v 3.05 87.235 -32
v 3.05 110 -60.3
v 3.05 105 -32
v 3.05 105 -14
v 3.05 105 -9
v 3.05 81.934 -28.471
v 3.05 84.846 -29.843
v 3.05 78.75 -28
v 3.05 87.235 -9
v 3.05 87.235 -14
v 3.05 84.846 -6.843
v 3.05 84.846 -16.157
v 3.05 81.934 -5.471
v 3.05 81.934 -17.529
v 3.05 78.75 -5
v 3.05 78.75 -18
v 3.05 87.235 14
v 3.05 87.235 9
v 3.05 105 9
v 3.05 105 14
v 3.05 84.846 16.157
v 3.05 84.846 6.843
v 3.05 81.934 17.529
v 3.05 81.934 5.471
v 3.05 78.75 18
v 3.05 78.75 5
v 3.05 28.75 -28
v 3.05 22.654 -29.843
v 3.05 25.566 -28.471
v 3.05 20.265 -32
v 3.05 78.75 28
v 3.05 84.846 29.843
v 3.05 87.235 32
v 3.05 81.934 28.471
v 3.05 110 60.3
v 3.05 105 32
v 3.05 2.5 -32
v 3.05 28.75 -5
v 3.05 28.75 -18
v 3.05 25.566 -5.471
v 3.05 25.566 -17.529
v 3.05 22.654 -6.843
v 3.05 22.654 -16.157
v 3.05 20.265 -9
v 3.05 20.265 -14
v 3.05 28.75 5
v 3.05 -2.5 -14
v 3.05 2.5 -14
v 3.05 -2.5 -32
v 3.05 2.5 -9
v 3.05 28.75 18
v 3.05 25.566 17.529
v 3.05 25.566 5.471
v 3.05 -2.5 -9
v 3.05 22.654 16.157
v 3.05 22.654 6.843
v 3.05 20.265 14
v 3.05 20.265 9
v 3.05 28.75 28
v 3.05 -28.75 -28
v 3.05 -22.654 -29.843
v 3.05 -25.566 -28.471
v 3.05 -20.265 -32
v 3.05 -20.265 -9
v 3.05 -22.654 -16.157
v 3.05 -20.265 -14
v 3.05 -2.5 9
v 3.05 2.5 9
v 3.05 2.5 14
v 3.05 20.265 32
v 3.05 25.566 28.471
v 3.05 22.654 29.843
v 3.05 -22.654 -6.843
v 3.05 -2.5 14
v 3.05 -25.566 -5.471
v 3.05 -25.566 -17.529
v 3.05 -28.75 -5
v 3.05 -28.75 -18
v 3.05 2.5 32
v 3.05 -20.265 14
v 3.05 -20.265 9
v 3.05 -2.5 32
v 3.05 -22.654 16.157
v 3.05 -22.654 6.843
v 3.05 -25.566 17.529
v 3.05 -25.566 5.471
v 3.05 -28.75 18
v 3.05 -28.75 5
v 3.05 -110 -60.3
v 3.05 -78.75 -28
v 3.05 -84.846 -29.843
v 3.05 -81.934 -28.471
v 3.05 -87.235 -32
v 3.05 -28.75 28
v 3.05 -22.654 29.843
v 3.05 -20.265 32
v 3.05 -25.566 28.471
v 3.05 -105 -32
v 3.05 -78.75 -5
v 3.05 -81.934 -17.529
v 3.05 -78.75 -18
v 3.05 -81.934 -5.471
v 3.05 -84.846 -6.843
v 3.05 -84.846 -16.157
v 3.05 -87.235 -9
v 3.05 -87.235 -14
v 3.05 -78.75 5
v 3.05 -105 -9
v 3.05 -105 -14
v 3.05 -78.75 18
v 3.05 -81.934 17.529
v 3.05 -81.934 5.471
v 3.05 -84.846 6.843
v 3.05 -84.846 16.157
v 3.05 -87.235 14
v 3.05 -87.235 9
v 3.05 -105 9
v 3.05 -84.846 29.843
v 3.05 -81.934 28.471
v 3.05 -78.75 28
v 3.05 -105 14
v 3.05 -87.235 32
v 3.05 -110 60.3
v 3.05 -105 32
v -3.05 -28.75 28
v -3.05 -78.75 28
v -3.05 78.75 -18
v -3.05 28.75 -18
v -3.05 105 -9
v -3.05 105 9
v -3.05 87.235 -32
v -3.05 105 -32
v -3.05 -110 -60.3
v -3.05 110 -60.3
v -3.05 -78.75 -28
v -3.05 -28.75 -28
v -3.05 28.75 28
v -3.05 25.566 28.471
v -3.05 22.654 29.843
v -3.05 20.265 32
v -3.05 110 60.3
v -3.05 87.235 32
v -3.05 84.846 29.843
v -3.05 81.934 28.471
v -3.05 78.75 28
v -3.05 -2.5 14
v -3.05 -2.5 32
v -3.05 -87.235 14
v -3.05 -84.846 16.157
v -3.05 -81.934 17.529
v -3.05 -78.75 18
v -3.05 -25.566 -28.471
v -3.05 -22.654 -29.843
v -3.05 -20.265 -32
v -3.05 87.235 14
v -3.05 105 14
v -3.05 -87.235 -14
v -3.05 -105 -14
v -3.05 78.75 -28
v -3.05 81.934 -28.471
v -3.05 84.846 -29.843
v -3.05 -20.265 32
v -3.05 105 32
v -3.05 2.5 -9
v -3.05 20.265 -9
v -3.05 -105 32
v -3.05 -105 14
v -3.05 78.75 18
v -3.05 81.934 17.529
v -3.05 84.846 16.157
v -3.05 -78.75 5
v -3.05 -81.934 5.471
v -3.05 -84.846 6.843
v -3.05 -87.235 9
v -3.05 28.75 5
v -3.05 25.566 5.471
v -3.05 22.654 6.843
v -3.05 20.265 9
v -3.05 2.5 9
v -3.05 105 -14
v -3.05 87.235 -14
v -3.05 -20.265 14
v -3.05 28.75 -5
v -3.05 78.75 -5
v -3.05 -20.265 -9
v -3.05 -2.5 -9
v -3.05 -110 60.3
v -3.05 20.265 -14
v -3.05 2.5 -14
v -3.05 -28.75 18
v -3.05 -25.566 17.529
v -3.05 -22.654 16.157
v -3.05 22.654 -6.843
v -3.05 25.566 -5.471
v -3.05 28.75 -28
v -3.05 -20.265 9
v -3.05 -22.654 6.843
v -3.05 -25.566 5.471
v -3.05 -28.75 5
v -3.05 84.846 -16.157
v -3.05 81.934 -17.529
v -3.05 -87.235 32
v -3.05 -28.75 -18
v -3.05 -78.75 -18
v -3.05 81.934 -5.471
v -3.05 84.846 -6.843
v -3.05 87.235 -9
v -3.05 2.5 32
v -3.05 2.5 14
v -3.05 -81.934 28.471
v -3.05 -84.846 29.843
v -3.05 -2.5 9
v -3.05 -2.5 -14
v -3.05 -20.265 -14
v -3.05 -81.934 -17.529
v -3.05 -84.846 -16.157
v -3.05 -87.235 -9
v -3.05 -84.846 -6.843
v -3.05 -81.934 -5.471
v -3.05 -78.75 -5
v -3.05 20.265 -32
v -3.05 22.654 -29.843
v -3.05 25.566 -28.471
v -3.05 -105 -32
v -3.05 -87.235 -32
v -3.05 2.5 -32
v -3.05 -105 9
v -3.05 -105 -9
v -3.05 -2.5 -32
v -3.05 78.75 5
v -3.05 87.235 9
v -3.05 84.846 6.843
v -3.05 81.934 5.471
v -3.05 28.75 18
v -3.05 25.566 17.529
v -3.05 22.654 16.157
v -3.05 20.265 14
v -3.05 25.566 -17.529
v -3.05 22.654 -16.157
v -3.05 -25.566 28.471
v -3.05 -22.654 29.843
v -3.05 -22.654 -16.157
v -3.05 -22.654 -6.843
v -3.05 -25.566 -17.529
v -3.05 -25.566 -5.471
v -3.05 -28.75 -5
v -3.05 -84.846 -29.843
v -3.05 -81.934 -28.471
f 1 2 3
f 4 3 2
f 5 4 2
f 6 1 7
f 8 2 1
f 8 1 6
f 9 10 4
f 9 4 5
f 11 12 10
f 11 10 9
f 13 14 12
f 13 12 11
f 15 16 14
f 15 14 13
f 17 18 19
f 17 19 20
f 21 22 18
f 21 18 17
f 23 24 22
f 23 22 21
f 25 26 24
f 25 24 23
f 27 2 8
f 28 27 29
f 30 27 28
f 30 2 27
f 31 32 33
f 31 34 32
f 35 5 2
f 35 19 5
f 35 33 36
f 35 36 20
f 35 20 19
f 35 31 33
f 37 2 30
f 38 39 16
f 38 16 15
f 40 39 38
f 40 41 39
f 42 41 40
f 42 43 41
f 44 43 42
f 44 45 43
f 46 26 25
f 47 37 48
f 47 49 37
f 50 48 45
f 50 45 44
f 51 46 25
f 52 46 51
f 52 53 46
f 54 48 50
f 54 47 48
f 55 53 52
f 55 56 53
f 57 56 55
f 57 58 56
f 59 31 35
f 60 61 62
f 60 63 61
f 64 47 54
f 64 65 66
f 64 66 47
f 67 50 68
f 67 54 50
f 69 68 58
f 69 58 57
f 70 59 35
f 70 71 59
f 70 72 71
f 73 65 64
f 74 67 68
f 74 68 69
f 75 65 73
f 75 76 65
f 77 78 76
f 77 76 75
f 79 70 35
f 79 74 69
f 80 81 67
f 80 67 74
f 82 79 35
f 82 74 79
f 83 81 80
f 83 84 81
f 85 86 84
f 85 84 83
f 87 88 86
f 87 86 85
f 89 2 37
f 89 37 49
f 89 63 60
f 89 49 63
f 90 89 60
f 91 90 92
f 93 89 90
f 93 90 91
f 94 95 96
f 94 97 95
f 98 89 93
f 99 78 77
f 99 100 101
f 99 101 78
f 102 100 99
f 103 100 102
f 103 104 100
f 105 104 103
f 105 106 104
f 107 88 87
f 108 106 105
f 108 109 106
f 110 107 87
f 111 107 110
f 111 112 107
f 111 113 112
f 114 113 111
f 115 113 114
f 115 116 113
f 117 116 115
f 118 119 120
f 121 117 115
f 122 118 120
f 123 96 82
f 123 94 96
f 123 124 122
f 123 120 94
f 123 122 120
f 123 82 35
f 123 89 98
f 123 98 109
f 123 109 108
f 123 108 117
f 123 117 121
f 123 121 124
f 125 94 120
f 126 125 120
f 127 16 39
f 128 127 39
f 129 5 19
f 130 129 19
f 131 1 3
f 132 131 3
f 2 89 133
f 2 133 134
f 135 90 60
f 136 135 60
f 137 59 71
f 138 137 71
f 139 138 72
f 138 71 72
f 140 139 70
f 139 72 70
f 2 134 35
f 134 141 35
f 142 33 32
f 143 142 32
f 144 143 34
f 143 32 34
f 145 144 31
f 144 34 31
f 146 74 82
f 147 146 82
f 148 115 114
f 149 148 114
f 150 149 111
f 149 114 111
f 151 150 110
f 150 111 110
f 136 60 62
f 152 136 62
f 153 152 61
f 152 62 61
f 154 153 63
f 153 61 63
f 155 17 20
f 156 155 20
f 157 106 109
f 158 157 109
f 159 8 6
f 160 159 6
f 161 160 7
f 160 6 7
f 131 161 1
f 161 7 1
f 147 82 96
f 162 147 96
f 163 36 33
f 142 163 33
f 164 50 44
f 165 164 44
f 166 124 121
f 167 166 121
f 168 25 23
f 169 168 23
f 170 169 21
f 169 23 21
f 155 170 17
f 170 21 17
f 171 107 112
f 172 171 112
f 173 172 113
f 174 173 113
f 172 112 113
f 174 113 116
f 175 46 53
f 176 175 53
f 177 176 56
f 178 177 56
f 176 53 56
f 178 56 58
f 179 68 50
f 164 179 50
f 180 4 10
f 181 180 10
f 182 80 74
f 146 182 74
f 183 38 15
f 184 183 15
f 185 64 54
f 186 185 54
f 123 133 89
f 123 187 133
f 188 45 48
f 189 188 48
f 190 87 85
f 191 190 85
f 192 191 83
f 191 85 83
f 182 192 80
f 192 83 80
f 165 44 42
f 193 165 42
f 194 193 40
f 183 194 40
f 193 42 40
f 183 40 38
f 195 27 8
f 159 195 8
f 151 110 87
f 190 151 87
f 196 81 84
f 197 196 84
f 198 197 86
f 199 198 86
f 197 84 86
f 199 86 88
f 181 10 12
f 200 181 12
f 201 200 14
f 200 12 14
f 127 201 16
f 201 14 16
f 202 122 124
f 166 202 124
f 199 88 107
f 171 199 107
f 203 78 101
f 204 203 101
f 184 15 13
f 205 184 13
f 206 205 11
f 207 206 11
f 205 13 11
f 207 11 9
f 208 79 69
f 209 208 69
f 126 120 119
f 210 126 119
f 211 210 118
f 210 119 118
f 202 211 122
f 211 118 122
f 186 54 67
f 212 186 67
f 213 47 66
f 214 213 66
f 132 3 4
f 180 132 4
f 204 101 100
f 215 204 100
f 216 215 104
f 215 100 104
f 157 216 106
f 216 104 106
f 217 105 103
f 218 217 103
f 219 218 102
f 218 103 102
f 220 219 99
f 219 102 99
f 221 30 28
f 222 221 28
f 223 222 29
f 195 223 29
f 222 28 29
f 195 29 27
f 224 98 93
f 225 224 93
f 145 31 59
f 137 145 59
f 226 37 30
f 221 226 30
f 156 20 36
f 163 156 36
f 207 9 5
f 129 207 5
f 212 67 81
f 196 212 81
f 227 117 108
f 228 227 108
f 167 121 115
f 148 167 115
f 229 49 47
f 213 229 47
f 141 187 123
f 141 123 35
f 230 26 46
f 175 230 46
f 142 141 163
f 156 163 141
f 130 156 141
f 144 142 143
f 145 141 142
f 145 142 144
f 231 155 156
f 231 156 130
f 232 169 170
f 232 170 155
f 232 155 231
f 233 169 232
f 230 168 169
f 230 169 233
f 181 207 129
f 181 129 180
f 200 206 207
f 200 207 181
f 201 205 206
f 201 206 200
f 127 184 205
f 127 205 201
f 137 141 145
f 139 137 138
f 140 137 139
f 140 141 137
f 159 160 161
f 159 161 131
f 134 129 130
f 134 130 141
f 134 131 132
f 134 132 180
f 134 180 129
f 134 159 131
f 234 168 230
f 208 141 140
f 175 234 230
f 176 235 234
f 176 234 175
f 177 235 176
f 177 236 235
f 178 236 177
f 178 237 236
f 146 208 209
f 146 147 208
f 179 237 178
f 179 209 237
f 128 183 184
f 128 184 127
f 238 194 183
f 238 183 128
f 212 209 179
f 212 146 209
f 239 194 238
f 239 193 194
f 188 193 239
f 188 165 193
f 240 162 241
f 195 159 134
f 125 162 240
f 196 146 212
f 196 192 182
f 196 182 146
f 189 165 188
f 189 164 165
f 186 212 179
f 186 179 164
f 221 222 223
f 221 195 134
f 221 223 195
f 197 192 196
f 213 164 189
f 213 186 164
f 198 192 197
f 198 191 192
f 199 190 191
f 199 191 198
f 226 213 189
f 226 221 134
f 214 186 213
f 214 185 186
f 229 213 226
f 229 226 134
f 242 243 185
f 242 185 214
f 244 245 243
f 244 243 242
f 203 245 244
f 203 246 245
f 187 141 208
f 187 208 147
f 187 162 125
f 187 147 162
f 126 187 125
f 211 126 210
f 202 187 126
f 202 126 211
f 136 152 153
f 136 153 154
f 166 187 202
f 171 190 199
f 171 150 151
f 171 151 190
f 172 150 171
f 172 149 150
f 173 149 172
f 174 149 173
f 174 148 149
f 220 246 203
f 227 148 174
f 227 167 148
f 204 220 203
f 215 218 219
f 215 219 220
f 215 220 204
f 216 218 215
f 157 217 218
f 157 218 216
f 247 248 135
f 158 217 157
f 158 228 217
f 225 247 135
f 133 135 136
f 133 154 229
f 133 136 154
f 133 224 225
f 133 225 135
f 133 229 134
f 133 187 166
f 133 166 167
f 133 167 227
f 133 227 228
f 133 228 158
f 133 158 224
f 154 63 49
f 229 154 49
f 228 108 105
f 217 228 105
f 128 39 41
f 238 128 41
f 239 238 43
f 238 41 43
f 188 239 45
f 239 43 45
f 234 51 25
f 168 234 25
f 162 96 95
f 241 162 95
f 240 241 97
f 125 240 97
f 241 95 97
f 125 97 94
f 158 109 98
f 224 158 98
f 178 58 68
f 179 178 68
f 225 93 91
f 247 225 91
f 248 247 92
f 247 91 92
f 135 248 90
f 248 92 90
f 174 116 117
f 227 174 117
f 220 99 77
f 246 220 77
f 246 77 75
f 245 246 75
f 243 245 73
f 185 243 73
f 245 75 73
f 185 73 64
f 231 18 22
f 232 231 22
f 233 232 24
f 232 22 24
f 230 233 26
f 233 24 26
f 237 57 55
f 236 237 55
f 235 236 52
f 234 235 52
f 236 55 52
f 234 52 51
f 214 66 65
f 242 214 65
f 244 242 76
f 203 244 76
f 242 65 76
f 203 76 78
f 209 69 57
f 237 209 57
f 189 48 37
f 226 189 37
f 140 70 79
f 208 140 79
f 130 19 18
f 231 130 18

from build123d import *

# Parameters (mm, degrees)
F1_DEPTH = 110
F3_DEPTH = 6.1
F4_W     = 220
F4_H     = 15.7
F5_DEPTH = 100


with BuildPart() as f1:
    # F0 (on Front) → F1 (new body, symmetric)
    with BuildSketch(Plane.XZ):
        with BuildLine():
            ThreePointArc((11.95, -69.2), (5.6567496474, -66.5932503526), (3.05, -60.3))
            Line((3.05, -60.3), (3.05, 60.3))
            ThreePointArc((3.05, 60.3), (5.6567496474, 66.5932503526), (11.95, 69.2))
            Line((11.95, 69.2), (76, 69.2))
            Line((76, 69.2), (76, 76))
            Line((76, 76), (-76, 76))
            Line((-76, 76), (-76, 69.2))
            Line((-76, 69.2), (-11.95, 69.2))
            ThreePointArc((-11.95, 69.2), (-5.6567496474, 66.5932503526), (-3.05, 60.3))
            Line((-3.05, 60.3), (-3.05, -60.3))
            ThreePointArc((-3.05, -60.3), (-5.6567496474, -66.5932503526), (-11.95, -69.2))
            Line((-11.95, -69.2), (-76, -69.2))
            Line((-76, -69.2), (-76, -76))
            Line((-76, -76), (76, -76))
            Line((76, -76), (76, -69.2))
            Line((76, -69.2), (11.95, -69.2))
        make_face()
    extrude(amount=F1_DEPTH, both=True)

    # F2 (on face) → F3 (cut)
    with BuildSketch(Plane.YZ.offset(3.05)):
        with BuildLine():
            Line((-20.2647186258, -9), (-2.5, -9))
            Line((-2.5, -9), (-2.5, 9))
            Line((-2.5, 9), (-20.2647186258, 9))
            ThreePointArc((-20.2647186258, 9), (-24.0595842402, 6.0501256289), (-28.75, 5))
            Line((-28.75, 5), (-78.75, 5))
            ThreePointArc((-78.75, 5), (-83.4404157598, 6.0501256289), (-87.2352813742, 9))
            Line((-87.2352813742, 9), (-105, 9))
            Line((-105, 9), (-105, -9))
            Line((-105, -9), (-87.2352813742, -9))
            ThreePointArc((-87.2352813742, -9), (-83.4404157598, -6.0501256289), (-78.75, -5))
            Line((-78.75, -5), (-28.75, -5))
            ThreePointArc((-28.75, -5), (-24.0595842402, -6.0501256289), (-20.2647186258, -9))
        make_face()
        with BuildLine():
            ThreePointArc((-20.2647186258, 32), (-24.0595842402, 29.0501256289), (-28.75, 28))
            Line((-28.75, 28), (-78.75, 28))
            ThreePointArc((-78.75, 28), (-83.4404157598, 29.0501256289), (-87.2352813742, 32))
            Line((-87.2352813742, 32), (-105, 32))
            Line((-105, 32), (-105, 14))
            Line((-105, 14), (-87.2352813742, 14))
            ThreePointArc((-87.2352813742, 14), (-83.4404157598, 16.9498743711), (-78.75, 18))
            Line((-78.75, 18), (-28.75, 18))
            ThreePointArc((-28.75, 18), (-24.0595842402, 16.9498743711), (-20.2647186258, 14))
            Line((-20.2647186258, 14), (-2.5, 14))
            Line((-2.5, 14), (-2.5, 32))
            Line((-2.5, 32), (-20.2647186258, 32))
        make_face()
        with BuildLine():
            ThreePointArc((-28.75, -28), (-24.0595842402, -29.0501256289), (-20.2647186258, -32))
            Line((-20.2647186258, -32), (-2.5, -32))
            Line((-2.5, -32), (-2.5, -14))
            Line((-2.5, -14), (-20.2647186258, -14))
            ThreePointArc((-20.2647186258, -14), (-24.0595842402, -16.9498743711), (-28.75, -18))
            Line((-28.75, -18), (-78.75, -18))
            ThreePointArc((-78.75, -18), (-83.4404157598, -16.9498743711), (-87.2352813742, -14))
            Line((-87.2352813742, -14), (-105, -14))
            Line((-105, -14), (-105, -32))
            Line((-105, -32), (-87.2352813742, -32))
            ThreePointArc((-87.2352813742, -32), (-83.4404157598, -29.0501256289), (-78.75, -28))
            Line((-78.75, -28), (-28.75, -28))
        make_face()
        with BuildLine():
            Line((78.75, 28), (28.75, 28))
            ThreePointArc((28.75, 28), (24.0595842402, 29.0501256289), (20.2647186258, 32))
            Line((20.2647186258, 32), (2.5, 32))
            Line((2.5, 32), (2.5, 14))
            Line((2.5, 14), (20.2647186258, 14))
            ThreePointArc((20.2647186258, 14), (24.0595842402, 16.9498743711), (28.75, 18))
            Line((28.75, 18), (78.75, 18))
            ThreePointArc((78.75, 18), (83.4404157598, 16.9498743711), (87.2352813742, 14))
            Line((87.2352813742, 14), (105, 14))
            Line((105, 14), (105, 32))
            Line((105, 32), (87.2352813742, 32))
            ThreePointArc((87.2352813742, 32), (83.4404157598, 29.0501256289), (78.75, 28))
        make_face()
        with BuildLine():
            ThreePointArc((20.2647186258, -32), (24.0595842402, -29.0501256289), (28.75, -28))
            Line((28.75, -28), (78.75, -28))
            ThreePointArc((78.75, -28), (83.4404157598, -29.0501256289), (87.2352813742, -32))
            Line((87.2352813742, -32), (105, -32))
            Line((105, -32), (105, -14))
            Line((105, -14), (87.2352813742, -14))
            ThreePointArc((87.2352813742, -14), (83.4404157598, -16.9498743711), (78.75, -18))
            Line((78.75, -18), (28.75, -18))
            ThreePointArc((28.75, -18), (24.0595842402, -16.9498743711), (20.2647186258, -14))
            Line((20.2647186258, -14), (2.5, -14))
            Line((2.5, -14), (2.5, -32))
            Line((2.5, -32), (20.2647186258, -32))
        make_face()
        with BuildLine():
            ThreePointArc((20.2647186258, -9), (24.0595842402, -6.0501256289), (28.75, -5))
            Line((28.75, -5), (78.75, -5))
            ThreePointArc((78.75, -5), (83.4404157598, -6.0501256289), (87.2352813742, -9))
            Line((87.2352813742, -9), (105, -9))
            Line((105, -9), (105, 9))
            Line((105, 9), (87.2352813742, 9))
            ThreePointArc((87.2352813742, 9), (83.4404157598, 6.0501256289), (78.75, 5))
            Line((78.75, 5), (28.75, 5))
            ThreePointArc((28.75, 5), (24.0595842402, 6.0501256289), (20.2647186258, 9))
            Line((20.2647186258, 9), (2.5, 9))
            Line((2.5, 9), (2.5, -9))
            Line((2.5, -9), (20.2647186258, -9))
        make_face()
    extrude(amount=-F3_DEPTH, mode=Mode.SUBTRACT)

    # F4 (on face) → F5 (cut, symmetric)
    with BuildSketch(Plane.YZ.offset(3.05)):
        with Locations((0, 68.15)):
            Rectangle(F4_W, F4_H)
        with Locations((0, -68.15)):
            Rectangle(F4_W, F4_H)
    extrude(amount=F5_DEPTH, both=True, mode=Mode.SUBTRACT)


solid = f1.part
